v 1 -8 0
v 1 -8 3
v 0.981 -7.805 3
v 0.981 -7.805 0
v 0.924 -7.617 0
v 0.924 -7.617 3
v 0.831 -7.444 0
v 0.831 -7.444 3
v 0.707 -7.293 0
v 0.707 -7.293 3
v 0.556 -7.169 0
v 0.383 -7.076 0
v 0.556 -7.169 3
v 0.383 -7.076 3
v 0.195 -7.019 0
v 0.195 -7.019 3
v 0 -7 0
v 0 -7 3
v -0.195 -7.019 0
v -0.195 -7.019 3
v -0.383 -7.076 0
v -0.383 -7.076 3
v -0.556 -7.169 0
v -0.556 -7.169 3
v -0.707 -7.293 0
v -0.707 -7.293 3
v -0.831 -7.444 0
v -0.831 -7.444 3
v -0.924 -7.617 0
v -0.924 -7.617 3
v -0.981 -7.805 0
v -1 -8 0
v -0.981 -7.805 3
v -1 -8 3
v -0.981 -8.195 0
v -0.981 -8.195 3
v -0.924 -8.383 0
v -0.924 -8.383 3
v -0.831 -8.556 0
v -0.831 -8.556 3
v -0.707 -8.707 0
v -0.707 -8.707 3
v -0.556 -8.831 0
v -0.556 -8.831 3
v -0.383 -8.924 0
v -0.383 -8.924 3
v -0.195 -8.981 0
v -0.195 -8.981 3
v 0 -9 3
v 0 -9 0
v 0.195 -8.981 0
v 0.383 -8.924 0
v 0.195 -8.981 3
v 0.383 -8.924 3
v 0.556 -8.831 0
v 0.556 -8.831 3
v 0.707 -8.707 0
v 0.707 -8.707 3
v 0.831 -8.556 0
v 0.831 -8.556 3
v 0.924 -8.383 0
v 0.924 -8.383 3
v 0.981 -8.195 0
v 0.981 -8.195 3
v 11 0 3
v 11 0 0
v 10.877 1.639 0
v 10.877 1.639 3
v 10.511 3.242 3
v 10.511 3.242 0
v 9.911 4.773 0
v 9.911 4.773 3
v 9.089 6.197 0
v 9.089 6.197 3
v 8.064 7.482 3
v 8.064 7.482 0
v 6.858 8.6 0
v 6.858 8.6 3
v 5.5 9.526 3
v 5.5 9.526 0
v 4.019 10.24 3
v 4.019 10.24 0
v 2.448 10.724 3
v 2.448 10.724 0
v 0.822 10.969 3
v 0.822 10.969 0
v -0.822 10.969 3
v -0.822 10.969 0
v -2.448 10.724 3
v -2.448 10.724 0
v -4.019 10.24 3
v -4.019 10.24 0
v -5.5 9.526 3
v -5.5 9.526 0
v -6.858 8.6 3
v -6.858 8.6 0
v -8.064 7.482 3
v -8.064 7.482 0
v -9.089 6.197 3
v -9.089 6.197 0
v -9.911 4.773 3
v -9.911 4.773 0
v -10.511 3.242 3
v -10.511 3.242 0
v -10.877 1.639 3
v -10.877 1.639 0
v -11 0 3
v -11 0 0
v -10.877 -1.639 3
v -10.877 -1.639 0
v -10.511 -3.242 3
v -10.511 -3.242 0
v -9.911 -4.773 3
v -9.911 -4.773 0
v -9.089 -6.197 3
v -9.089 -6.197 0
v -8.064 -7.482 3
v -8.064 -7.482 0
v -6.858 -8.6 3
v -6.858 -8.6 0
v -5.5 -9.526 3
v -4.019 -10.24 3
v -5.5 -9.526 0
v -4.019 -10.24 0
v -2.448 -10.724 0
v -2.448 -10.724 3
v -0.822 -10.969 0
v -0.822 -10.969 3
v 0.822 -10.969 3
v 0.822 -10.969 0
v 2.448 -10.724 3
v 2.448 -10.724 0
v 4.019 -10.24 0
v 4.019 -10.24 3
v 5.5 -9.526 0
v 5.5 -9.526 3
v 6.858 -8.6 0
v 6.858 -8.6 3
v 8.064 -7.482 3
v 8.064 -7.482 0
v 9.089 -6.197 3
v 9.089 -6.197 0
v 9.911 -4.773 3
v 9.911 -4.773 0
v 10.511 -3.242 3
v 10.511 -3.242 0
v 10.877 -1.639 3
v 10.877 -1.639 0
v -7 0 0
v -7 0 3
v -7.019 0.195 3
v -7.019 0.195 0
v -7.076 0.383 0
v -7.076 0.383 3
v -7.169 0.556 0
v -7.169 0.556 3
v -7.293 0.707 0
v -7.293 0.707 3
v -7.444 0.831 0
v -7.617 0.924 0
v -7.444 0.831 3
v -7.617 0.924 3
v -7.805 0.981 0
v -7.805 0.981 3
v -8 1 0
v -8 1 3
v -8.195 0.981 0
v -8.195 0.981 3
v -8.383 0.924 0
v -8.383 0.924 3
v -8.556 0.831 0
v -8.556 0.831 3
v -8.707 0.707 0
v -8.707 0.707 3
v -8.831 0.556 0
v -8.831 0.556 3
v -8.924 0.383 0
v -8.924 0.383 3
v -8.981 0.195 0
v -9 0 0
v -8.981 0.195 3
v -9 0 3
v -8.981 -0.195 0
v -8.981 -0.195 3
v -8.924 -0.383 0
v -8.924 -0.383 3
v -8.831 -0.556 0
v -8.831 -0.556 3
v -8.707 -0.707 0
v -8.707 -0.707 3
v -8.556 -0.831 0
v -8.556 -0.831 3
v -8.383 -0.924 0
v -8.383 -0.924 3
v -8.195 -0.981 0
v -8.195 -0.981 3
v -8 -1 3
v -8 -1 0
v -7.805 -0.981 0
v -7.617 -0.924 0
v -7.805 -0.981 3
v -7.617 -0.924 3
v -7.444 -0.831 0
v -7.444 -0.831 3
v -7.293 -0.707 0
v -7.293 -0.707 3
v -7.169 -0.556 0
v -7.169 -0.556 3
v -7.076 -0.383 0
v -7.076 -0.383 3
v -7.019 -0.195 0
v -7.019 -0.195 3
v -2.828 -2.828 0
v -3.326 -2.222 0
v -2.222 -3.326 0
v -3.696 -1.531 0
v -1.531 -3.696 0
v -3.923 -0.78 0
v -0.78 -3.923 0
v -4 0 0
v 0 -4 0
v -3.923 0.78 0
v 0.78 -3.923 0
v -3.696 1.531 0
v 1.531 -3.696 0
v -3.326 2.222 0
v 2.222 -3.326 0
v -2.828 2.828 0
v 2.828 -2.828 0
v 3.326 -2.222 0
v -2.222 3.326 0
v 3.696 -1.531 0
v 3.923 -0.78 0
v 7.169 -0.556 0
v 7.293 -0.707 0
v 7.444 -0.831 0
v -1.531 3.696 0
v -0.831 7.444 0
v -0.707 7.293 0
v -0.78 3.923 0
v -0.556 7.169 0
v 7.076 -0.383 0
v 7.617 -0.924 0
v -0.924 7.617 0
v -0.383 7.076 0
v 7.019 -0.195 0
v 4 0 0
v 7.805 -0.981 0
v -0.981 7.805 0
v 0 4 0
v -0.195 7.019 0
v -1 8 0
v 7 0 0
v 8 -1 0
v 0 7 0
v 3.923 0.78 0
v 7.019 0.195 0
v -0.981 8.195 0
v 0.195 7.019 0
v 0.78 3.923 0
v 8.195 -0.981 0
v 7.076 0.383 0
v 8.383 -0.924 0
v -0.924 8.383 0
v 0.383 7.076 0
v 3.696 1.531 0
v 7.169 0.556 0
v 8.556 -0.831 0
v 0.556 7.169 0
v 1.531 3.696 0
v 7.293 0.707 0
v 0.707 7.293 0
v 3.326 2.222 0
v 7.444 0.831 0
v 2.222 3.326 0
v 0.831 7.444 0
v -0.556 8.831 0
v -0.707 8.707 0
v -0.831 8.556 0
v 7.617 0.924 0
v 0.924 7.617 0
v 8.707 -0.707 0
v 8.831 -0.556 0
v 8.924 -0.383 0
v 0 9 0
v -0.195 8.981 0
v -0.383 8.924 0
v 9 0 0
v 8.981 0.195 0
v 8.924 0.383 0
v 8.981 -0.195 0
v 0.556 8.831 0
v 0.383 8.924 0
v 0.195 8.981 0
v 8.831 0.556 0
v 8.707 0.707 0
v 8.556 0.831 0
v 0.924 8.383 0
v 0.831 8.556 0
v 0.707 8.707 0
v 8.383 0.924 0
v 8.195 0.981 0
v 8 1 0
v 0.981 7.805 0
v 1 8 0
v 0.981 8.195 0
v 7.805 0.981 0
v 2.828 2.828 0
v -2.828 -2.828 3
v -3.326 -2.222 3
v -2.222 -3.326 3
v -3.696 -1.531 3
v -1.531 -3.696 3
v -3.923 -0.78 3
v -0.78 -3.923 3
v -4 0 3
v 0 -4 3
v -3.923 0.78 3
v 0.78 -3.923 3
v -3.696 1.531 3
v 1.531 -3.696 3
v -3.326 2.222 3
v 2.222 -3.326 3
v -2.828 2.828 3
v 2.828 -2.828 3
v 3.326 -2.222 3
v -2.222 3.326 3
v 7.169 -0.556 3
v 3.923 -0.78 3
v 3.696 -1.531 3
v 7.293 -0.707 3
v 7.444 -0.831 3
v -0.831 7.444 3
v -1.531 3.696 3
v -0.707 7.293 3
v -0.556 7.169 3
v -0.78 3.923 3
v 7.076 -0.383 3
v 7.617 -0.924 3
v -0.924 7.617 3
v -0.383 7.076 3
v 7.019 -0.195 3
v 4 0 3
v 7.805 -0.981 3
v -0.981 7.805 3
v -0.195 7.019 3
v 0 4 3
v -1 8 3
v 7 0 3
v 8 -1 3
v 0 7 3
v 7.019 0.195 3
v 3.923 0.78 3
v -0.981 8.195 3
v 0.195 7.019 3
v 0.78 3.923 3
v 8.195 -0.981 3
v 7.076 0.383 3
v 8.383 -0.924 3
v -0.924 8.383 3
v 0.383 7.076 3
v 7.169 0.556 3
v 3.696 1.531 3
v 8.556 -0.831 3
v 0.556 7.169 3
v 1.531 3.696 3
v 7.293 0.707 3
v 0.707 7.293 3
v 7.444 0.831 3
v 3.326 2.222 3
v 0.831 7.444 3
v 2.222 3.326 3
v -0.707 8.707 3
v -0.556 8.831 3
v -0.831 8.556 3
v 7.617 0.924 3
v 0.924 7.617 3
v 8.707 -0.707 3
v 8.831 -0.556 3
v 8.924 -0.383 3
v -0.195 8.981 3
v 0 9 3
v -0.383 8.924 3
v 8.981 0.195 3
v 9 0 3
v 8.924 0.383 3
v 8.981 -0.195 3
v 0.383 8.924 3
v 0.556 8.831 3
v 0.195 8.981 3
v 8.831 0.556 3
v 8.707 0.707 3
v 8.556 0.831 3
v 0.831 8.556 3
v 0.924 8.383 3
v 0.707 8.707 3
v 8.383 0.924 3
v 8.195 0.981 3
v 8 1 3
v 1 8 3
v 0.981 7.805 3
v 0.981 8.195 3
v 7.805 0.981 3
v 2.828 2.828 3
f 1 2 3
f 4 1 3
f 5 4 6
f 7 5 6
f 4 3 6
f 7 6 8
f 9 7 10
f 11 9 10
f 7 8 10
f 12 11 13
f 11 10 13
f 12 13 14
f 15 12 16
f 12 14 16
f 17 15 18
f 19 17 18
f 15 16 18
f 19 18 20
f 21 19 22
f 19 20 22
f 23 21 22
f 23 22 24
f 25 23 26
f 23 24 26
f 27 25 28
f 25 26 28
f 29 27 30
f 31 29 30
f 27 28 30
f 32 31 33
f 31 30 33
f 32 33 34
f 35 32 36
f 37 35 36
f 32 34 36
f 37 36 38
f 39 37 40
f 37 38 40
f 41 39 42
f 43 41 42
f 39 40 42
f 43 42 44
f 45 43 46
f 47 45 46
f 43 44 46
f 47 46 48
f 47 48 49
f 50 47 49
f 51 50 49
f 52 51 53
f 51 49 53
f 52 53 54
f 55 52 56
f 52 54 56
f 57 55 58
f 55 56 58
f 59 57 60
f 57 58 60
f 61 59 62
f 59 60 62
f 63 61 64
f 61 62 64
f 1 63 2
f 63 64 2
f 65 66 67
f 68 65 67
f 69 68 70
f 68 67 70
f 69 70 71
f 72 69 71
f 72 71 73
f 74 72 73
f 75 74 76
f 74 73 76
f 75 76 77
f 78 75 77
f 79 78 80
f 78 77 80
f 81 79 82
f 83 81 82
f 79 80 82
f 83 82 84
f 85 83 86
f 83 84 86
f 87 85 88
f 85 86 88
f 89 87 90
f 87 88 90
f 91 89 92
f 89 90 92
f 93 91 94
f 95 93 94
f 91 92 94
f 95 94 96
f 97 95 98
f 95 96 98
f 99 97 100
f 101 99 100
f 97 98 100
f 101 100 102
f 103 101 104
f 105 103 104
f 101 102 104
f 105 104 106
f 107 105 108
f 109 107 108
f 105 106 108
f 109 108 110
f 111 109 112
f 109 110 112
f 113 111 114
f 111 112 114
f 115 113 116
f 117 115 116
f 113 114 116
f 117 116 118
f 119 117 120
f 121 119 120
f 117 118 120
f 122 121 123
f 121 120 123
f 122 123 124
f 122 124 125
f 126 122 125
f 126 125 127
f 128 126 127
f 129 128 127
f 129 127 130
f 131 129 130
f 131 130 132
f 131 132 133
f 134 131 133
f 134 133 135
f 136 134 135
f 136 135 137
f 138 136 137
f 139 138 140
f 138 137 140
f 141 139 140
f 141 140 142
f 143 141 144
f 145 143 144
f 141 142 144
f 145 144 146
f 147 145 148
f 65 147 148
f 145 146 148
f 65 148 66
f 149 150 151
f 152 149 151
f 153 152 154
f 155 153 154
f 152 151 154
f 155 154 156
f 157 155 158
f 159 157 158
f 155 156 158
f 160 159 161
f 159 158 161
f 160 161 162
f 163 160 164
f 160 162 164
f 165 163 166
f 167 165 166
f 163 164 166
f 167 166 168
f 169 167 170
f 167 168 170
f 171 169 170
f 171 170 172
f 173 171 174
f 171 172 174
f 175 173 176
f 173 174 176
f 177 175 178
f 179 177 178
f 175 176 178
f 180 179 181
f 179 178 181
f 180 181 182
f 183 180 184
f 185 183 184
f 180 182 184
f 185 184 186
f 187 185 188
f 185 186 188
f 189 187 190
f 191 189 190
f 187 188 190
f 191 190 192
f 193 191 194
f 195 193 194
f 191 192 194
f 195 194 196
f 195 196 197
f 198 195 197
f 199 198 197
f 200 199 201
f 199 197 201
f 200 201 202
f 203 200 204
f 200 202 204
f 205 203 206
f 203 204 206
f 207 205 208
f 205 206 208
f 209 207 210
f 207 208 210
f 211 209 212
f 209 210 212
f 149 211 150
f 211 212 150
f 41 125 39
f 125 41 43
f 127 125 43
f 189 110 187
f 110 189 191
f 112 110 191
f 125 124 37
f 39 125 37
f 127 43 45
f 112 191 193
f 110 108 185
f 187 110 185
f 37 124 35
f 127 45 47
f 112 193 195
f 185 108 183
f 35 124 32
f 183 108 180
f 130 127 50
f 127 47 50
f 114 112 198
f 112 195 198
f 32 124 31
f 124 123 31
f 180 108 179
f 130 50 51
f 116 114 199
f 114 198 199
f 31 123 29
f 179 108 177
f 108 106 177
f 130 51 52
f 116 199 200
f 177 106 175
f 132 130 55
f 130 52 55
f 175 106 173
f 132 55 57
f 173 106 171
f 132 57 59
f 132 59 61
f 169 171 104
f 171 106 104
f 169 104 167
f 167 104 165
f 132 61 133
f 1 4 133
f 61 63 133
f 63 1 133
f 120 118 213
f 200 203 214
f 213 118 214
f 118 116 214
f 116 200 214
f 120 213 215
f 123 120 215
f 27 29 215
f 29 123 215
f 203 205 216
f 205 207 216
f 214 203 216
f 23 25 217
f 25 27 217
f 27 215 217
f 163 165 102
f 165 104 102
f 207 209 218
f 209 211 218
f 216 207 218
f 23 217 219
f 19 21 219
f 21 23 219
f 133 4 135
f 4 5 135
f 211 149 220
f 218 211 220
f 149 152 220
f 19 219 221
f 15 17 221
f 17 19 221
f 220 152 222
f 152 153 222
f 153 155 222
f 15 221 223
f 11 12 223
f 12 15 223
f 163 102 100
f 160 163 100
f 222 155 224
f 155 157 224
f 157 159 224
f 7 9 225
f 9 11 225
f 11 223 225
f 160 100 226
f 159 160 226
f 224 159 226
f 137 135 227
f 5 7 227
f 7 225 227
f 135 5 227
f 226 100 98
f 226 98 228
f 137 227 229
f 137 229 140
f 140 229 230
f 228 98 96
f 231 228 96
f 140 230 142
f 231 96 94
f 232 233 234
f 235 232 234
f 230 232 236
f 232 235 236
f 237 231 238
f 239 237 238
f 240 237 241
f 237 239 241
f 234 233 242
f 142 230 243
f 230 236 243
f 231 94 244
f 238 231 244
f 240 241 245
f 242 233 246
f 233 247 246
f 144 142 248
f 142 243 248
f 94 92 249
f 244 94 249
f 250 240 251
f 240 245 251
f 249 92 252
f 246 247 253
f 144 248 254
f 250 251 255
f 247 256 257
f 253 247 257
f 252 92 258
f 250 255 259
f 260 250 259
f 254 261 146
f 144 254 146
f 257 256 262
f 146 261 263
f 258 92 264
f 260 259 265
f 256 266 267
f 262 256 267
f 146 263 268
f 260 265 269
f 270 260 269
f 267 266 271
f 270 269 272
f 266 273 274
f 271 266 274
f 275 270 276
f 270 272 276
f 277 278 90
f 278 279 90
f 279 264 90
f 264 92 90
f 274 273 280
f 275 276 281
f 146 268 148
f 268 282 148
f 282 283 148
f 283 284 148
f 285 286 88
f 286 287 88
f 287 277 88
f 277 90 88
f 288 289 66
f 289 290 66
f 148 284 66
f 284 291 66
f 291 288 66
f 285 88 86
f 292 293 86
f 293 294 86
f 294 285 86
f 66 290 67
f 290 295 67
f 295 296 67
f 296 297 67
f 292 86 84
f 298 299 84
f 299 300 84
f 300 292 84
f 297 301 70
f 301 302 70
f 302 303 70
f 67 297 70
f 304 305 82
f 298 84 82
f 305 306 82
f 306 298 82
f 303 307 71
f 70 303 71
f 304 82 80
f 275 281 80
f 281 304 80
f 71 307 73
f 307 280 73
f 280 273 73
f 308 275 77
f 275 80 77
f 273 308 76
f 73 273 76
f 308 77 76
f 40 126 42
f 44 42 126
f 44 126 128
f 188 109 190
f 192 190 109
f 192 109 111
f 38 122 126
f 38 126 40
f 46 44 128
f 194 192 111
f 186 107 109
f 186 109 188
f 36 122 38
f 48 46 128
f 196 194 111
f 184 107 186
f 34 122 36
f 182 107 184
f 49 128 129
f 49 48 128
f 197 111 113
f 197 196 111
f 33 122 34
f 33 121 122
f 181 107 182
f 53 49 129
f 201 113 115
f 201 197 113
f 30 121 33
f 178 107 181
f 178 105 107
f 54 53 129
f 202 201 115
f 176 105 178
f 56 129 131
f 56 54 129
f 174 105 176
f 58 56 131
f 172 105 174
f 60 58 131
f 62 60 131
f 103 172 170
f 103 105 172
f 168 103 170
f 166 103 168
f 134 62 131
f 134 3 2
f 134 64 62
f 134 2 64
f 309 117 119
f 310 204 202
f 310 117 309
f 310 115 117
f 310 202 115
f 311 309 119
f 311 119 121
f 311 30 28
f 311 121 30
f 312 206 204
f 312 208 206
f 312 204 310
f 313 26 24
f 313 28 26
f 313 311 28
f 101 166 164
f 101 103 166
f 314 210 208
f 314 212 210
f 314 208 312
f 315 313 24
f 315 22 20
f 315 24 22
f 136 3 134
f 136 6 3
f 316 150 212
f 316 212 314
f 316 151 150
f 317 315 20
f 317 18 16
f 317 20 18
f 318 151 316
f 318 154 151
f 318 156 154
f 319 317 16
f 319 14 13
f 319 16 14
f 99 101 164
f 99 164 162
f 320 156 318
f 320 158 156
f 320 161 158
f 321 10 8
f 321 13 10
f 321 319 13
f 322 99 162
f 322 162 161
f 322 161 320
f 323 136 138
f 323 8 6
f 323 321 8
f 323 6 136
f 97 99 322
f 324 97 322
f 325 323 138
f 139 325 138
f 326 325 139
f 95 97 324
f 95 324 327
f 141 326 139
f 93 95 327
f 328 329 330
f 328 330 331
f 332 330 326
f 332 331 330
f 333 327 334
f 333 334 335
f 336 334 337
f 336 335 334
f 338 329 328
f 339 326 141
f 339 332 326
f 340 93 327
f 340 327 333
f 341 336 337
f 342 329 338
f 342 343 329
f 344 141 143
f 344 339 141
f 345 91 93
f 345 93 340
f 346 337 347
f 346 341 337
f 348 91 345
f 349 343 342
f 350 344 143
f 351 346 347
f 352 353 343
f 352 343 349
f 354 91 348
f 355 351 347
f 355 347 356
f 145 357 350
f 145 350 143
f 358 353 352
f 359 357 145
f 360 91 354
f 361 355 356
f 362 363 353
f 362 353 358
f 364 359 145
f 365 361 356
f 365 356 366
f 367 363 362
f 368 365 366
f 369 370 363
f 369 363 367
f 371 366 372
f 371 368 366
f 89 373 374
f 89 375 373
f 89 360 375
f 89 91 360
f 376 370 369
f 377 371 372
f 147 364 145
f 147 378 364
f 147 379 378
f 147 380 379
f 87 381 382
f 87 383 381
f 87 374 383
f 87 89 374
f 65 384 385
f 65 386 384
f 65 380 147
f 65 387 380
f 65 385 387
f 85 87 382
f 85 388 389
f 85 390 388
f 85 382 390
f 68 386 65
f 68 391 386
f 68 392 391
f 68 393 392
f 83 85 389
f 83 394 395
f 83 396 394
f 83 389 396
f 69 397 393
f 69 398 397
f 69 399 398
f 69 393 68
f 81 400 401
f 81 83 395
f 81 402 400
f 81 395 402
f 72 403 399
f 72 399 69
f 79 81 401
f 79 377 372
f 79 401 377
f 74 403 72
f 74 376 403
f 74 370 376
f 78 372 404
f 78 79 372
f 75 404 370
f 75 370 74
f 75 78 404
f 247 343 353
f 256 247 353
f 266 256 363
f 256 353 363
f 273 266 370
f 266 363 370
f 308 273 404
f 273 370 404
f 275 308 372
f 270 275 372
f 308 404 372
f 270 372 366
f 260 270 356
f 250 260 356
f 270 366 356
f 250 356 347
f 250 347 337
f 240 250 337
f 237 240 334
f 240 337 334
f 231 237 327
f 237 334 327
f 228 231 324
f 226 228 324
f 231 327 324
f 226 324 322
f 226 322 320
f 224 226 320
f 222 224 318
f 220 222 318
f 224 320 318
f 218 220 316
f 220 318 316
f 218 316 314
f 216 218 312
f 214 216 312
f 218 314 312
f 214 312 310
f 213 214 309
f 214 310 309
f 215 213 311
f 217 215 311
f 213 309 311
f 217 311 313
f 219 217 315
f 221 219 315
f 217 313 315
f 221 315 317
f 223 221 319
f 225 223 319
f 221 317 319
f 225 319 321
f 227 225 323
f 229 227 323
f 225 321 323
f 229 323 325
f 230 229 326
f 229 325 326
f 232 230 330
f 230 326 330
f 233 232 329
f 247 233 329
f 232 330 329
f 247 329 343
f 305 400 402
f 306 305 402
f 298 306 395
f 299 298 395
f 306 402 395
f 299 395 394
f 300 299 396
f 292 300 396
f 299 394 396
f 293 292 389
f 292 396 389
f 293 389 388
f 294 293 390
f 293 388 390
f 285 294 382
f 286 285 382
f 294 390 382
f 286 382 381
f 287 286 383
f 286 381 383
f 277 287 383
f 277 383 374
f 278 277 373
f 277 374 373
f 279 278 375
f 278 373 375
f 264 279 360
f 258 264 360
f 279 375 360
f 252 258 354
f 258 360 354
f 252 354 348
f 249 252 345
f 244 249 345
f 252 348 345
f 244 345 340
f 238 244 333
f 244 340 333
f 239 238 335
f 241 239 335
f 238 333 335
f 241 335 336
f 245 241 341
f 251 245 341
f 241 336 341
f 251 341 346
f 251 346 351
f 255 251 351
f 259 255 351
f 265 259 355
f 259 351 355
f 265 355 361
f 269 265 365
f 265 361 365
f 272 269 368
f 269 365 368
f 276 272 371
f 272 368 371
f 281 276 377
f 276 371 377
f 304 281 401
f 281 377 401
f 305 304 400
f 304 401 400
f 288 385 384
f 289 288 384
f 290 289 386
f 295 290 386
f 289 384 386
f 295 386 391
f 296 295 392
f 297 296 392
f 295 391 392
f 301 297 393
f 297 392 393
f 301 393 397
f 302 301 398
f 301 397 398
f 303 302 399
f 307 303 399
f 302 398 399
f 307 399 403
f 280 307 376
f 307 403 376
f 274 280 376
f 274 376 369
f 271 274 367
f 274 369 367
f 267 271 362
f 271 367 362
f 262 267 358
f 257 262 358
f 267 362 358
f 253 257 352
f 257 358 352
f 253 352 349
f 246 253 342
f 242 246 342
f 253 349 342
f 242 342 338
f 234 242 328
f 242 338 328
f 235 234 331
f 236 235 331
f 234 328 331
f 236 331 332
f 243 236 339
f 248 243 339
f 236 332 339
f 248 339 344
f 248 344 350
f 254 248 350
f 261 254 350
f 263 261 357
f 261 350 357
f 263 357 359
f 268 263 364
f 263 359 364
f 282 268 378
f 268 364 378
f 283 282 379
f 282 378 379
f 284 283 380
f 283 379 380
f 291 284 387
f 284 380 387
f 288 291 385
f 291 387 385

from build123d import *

# Parameters (mm, degrees)
ESQUISSE1_R             = 11
BOSS_EXTRU_1_DEPTH      = 3
ESQUISSE2_R             = 4
ESQUISSE2_R_2           = 1
ENL_V_MAT_EXTRU_1_DEPTH = 3


with BuildPart() as part:
    # Esquisse1 → Boss.-Extru.1 (new body)
    with BuildSketch(Plane.XY):
        Circle(ESQUISSE1_R)
    extrude(amount=BOSS_EXTRU_1_DEPTH)

    # Esquisse2 → Enlèv. mat.-Extru.1 (cut)
    with BuildSketch(Plane.XY.offset(3)):
        Circle(ESQUISSE2_R)
        with Locations((0, 8)):
            Circle(ESQUISSE2_R_2)
        with Locations((0, -8)):
            Circle(ESQUISSE2_R_2)
        with Locations((8, 0)):
            Circle(ESQUISSE2_R_2)
        with Locations((-8, 0)):
            Circle(ESQUISSE2_R_2)
    extrude(amount=-ENL_V_MAT_EXTRU_1_DEPTH, mode=Mode.SUBTRACT)


solid = part.part
